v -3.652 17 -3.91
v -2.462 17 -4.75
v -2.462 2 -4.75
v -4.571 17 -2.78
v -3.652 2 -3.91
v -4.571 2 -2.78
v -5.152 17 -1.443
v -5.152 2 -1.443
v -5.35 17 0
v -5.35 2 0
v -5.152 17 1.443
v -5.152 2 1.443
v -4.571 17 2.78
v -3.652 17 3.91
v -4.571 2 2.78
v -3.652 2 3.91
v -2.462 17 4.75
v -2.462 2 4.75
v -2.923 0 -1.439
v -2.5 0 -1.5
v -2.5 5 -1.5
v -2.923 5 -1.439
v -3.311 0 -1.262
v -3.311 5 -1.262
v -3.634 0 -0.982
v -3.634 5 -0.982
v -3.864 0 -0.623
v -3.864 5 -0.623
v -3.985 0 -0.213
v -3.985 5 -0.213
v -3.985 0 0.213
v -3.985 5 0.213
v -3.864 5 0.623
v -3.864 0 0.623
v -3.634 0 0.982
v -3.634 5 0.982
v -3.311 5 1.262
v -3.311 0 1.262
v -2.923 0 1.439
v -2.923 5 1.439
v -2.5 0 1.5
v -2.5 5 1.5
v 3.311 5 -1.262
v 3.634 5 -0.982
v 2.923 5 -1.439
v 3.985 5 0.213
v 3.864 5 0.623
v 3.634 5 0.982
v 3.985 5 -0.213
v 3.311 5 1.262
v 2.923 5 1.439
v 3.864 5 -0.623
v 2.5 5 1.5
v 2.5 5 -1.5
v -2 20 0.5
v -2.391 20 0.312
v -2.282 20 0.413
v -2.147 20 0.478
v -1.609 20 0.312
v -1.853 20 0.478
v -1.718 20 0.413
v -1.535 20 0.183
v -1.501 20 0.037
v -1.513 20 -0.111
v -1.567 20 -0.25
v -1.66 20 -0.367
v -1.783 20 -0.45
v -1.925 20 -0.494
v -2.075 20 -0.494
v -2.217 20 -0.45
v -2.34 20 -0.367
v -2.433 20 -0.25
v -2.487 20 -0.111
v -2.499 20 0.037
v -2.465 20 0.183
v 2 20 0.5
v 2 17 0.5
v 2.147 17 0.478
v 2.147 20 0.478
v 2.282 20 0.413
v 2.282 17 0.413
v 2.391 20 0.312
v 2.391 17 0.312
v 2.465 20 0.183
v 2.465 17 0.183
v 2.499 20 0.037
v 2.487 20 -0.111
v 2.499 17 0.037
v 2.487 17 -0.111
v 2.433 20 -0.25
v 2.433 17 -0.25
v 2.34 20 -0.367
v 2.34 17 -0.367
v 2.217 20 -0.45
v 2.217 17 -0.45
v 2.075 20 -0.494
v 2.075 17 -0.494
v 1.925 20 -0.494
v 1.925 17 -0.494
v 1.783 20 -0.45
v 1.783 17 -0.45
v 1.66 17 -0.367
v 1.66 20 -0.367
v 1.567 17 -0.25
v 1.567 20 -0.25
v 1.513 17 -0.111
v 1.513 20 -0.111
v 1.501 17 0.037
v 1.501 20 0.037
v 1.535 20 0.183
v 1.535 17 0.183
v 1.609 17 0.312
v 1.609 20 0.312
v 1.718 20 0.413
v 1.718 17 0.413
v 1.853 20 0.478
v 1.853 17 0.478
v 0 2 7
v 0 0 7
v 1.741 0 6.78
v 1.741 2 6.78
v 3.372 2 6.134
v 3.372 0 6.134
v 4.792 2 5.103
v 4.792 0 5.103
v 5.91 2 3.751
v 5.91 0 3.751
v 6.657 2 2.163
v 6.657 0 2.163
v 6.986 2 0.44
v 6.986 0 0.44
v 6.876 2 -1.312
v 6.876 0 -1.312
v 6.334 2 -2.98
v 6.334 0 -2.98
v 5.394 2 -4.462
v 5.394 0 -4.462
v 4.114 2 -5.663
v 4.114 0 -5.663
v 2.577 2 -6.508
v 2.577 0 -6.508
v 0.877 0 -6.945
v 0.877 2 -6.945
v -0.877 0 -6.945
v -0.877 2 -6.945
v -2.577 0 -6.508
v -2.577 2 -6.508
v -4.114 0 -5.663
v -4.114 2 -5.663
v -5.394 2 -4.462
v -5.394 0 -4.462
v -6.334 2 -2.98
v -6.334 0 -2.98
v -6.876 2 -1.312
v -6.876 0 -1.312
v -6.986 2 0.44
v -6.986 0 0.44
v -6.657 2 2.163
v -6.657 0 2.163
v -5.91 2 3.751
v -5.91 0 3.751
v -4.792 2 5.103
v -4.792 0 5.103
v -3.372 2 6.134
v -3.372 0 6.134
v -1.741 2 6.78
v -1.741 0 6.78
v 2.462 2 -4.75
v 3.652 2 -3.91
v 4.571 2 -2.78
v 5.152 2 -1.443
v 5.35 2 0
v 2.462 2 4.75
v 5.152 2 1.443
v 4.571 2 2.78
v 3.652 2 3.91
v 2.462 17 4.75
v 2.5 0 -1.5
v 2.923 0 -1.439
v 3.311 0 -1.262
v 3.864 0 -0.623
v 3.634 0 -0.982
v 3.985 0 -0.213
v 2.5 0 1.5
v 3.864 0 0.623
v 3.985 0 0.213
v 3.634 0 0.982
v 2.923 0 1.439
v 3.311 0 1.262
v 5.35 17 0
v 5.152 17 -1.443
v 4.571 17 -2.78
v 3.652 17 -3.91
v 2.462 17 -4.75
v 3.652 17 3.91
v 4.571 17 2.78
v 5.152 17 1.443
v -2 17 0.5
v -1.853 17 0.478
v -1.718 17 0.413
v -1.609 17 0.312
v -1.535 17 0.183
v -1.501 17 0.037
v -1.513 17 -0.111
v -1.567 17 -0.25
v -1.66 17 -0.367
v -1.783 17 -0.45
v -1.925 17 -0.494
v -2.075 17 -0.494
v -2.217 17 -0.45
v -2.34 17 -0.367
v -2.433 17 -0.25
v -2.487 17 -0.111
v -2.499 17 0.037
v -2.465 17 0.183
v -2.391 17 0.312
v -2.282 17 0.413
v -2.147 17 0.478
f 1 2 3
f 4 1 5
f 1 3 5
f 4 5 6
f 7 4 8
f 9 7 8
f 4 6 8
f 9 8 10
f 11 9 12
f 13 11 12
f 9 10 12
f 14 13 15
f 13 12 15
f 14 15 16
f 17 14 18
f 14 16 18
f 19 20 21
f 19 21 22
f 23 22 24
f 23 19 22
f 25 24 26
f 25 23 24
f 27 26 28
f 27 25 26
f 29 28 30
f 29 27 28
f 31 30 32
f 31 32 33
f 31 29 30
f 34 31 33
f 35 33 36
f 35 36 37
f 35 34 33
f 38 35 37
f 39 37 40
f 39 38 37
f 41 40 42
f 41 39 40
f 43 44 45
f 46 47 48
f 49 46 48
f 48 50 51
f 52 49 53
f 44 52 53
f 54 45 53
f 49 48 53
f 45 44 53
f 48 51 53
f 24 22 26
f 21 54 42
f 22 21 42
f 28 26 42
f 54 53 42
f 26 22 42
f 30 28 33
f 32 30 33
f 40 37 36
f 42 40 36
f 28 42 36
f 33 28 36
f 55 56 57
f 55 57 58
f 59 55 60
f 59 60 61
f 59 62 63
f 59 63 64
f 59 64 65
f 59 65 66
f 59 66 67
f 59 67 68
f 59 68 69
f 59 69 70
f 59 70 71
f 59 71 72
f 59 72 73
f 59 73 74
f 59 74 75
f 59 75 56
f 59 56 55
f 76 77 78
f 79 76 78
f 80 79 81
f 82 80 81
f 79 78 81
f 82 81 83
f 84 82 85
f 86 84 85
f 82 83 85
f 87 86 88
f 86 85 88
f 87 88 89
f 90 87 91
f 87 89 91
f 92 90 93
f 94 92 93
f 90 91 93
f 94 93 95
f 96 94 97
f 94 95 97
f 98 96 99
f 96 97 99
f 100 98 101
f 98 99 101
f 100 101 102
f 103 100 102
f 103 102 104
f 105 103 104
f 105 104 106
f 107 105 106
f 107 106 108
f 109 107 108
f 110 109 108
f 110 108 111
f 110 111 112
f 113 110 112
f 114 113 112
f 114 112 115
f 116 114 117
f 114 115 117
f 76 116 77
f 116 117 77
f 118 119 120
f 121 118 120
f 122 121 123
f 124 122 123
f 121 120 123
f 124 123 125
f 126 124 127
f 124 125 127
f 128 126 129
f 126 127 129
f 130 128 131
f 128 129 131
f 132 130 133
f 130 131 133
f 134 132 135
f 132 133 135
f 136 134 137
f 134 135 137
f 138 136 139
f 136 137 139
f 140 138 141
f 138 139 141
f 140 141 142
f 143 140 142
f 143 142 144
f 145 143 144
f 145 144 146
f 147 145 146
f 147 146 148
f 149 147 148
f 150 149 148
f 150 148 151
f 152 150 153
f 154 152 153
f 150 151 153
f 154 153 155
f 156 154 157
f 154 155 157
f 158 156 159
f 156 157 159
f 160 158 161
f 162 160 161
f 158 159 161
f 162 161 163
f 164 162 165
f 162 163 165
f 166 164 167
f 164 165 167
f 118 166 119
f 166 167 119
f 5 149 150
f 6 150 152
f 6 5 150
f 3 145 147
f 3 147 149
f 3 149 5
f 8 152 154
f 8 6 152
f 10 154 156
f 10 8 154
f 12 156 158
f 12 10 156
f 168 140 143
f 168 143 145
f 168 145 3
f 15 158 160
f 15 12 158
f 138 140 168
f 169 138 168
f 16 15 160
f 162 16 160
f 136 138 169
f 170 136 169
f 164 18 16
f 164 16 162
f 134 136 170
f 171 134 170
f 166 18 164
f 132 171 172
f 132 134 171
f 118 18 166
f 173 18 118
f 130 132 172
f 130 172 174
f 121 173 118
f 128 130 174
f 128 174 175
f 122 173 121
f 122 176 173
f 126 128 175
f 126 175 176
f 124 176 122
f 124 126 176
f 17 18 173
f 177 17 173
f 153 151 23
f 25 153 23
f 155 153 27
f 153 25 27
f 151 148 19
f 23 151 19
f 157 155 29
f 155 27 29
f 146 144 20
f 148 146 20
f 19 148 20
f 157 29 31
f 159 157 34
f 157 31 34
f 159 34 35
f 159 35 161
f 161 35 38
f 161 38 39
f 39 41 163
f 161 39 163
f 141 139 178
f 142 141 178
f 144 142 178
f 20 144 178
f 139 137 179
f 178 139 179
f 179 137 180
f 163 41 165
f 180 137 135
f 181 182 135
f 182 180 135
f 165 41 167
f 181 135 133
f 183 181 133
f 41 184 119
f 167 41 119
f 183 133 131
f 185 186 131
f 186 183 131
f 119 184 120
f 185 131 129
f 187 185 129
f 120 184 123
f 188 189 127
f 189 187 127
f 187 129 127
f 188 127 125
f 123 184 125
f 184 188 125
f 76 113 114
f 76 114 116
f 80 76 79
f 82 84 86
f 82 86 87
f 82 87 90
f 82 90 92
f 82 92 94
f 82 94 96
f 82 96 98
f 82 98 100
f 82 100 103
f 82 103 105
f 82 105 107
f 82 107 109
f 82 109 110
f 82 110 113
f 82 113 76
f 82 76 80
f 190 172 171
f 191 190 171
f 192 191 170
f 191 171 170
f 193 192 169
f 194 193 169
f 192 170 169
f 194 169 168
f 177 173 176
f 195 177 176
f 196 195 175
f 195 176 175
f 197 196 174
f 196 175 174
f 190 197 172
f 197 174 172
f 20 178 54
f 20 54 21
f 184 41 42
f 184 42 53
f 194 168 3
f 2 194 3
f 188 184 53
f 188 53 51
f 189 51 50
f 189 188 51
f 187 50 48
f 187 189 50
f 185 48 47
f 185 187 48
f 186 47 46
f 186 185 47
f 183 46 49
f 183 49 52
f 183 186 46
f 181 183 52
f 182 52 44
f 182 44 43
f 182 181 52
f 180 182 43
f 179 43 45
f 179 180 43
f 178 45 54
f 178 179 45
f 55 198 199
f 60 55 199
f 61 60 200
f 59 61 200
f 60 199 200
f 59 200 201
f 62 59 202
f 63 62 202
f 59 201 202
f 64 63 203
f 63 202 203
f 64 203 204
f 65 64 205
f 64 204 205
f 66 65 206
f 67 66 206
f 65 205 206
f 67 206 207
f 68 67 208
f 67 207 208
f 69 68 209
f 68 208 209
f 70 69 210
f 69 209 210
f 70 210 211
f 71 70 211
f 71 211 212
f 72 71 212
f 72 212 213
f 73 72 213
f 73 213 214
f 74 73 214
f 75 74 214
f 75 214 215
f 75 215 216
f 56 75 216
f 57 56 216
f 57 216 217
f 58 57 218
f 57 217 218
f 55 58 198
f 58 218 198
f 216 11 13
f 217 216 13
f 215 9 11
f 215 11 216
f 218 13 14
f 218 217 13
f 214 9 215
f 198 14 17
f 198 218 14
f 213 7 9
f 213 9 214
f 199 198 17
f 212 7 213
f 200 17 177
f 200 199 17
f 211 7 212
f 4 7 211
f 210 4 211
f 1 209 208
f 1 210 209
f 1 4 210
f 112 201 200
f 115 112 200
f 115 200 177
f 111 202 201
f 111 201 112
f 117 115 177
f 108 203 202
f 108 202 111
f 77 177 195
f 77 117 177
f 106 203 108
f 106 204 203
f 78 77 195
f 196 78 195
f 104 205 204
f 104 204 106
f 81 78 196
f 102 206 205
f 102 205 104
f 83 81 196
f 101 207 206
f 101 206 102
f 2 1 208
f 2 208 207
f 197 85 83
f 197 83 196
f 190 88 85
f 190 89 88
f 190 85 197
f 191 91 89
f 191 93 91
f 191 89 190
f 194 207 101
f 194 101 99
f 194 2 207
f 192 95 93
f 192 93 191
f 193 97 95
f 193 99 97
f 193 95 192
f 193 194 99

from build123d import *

# Parameters (mm, degrees)
SKETCH_1_R          = 7
EXTRUDE_1_DEPTH     = 2
EXTRUDE_2_DEPTH     = 15
SKETCH_3_R          = 0.5
EXTRUDE_3_DEPTH     = 3
CUT_EXTRUDE_1_DEPTH = 5


with BuildPart() as part:
    # 草图1 → 凸台-拉伸1 (new body)
    with BuildSketch(Plane(origin=(0, 0, 0), x_dir=(1, 0, 0), z_dir=(0, 1, 0))):
        with Locations(Location((0, 0, 0), (0, 0, 270))):
            Circle(SKETCH_1_R)
    extrude(amount=EXTRUDE_1_DEPTH)

    # 草图2 → 凸台-拉伸2 (add)
    with BuildSketch(Plane(origin=(0, 2, 0), x_dir=(1, 0, 0), z_dir=(0, 1, 0))):
        with BuildLine():
            Line((2.461706725, 4.75), (-2.461706725, 4.75))
            ThreePointArc((-2.461706725, 4.75), (-5.35, 0), (-2.461706725, -4.75))
            Line((-2.461706725, -4.75), (2.461706725, -4.75))
            ThreePointArc((2.461706725, -4.75), (4.571248789, -2.779601502), (5.35, 0))
            ThreePointArc((5.35, 0), (4.571248789, 2.779601502), (2.461706725, 4.75))
        make_face()
    extrude(amount=EXTRUDE_2_DEPTH)

    # 草图3 → 凸台-拉伸3 (add)
    with BuildSketch(Plane(origin=(0, 17, 0), x_dir=(1, 0, 0), z_dir=(0, 1, 0))):
        with Locations(Location((-2, 0, 0), (0, 0, 270))):
            Circle(SKETCH_3_R)
        with Locations(Location((2, 0, 0), (0, 0, 270))):
            Circle(SKETCH_3_R)
    extrude(amount=EXTRUDE_3_DEPTH)

    # 草图4 → 切除-拉伸1 (cut)
    with BuildSketch(Plane.XZ):
        with BuildLine():
            Line((-2.5, 1.5), (2.5, 1.5))
            ThreePointArc((2.5, 1.5), (4, 0), (2.5, -1.5))
            Line((2.5, -1.5), (-2.5, -1.5))
            ThreePointArc((-2.5, -1.5), (-4, 0), (-2.5, 1.5))
        make_face()
    extrude(amount=-CUT_EXTRUDE_1_DEPTH, mode=Mode.SUBTRACT)


solid = part.part
